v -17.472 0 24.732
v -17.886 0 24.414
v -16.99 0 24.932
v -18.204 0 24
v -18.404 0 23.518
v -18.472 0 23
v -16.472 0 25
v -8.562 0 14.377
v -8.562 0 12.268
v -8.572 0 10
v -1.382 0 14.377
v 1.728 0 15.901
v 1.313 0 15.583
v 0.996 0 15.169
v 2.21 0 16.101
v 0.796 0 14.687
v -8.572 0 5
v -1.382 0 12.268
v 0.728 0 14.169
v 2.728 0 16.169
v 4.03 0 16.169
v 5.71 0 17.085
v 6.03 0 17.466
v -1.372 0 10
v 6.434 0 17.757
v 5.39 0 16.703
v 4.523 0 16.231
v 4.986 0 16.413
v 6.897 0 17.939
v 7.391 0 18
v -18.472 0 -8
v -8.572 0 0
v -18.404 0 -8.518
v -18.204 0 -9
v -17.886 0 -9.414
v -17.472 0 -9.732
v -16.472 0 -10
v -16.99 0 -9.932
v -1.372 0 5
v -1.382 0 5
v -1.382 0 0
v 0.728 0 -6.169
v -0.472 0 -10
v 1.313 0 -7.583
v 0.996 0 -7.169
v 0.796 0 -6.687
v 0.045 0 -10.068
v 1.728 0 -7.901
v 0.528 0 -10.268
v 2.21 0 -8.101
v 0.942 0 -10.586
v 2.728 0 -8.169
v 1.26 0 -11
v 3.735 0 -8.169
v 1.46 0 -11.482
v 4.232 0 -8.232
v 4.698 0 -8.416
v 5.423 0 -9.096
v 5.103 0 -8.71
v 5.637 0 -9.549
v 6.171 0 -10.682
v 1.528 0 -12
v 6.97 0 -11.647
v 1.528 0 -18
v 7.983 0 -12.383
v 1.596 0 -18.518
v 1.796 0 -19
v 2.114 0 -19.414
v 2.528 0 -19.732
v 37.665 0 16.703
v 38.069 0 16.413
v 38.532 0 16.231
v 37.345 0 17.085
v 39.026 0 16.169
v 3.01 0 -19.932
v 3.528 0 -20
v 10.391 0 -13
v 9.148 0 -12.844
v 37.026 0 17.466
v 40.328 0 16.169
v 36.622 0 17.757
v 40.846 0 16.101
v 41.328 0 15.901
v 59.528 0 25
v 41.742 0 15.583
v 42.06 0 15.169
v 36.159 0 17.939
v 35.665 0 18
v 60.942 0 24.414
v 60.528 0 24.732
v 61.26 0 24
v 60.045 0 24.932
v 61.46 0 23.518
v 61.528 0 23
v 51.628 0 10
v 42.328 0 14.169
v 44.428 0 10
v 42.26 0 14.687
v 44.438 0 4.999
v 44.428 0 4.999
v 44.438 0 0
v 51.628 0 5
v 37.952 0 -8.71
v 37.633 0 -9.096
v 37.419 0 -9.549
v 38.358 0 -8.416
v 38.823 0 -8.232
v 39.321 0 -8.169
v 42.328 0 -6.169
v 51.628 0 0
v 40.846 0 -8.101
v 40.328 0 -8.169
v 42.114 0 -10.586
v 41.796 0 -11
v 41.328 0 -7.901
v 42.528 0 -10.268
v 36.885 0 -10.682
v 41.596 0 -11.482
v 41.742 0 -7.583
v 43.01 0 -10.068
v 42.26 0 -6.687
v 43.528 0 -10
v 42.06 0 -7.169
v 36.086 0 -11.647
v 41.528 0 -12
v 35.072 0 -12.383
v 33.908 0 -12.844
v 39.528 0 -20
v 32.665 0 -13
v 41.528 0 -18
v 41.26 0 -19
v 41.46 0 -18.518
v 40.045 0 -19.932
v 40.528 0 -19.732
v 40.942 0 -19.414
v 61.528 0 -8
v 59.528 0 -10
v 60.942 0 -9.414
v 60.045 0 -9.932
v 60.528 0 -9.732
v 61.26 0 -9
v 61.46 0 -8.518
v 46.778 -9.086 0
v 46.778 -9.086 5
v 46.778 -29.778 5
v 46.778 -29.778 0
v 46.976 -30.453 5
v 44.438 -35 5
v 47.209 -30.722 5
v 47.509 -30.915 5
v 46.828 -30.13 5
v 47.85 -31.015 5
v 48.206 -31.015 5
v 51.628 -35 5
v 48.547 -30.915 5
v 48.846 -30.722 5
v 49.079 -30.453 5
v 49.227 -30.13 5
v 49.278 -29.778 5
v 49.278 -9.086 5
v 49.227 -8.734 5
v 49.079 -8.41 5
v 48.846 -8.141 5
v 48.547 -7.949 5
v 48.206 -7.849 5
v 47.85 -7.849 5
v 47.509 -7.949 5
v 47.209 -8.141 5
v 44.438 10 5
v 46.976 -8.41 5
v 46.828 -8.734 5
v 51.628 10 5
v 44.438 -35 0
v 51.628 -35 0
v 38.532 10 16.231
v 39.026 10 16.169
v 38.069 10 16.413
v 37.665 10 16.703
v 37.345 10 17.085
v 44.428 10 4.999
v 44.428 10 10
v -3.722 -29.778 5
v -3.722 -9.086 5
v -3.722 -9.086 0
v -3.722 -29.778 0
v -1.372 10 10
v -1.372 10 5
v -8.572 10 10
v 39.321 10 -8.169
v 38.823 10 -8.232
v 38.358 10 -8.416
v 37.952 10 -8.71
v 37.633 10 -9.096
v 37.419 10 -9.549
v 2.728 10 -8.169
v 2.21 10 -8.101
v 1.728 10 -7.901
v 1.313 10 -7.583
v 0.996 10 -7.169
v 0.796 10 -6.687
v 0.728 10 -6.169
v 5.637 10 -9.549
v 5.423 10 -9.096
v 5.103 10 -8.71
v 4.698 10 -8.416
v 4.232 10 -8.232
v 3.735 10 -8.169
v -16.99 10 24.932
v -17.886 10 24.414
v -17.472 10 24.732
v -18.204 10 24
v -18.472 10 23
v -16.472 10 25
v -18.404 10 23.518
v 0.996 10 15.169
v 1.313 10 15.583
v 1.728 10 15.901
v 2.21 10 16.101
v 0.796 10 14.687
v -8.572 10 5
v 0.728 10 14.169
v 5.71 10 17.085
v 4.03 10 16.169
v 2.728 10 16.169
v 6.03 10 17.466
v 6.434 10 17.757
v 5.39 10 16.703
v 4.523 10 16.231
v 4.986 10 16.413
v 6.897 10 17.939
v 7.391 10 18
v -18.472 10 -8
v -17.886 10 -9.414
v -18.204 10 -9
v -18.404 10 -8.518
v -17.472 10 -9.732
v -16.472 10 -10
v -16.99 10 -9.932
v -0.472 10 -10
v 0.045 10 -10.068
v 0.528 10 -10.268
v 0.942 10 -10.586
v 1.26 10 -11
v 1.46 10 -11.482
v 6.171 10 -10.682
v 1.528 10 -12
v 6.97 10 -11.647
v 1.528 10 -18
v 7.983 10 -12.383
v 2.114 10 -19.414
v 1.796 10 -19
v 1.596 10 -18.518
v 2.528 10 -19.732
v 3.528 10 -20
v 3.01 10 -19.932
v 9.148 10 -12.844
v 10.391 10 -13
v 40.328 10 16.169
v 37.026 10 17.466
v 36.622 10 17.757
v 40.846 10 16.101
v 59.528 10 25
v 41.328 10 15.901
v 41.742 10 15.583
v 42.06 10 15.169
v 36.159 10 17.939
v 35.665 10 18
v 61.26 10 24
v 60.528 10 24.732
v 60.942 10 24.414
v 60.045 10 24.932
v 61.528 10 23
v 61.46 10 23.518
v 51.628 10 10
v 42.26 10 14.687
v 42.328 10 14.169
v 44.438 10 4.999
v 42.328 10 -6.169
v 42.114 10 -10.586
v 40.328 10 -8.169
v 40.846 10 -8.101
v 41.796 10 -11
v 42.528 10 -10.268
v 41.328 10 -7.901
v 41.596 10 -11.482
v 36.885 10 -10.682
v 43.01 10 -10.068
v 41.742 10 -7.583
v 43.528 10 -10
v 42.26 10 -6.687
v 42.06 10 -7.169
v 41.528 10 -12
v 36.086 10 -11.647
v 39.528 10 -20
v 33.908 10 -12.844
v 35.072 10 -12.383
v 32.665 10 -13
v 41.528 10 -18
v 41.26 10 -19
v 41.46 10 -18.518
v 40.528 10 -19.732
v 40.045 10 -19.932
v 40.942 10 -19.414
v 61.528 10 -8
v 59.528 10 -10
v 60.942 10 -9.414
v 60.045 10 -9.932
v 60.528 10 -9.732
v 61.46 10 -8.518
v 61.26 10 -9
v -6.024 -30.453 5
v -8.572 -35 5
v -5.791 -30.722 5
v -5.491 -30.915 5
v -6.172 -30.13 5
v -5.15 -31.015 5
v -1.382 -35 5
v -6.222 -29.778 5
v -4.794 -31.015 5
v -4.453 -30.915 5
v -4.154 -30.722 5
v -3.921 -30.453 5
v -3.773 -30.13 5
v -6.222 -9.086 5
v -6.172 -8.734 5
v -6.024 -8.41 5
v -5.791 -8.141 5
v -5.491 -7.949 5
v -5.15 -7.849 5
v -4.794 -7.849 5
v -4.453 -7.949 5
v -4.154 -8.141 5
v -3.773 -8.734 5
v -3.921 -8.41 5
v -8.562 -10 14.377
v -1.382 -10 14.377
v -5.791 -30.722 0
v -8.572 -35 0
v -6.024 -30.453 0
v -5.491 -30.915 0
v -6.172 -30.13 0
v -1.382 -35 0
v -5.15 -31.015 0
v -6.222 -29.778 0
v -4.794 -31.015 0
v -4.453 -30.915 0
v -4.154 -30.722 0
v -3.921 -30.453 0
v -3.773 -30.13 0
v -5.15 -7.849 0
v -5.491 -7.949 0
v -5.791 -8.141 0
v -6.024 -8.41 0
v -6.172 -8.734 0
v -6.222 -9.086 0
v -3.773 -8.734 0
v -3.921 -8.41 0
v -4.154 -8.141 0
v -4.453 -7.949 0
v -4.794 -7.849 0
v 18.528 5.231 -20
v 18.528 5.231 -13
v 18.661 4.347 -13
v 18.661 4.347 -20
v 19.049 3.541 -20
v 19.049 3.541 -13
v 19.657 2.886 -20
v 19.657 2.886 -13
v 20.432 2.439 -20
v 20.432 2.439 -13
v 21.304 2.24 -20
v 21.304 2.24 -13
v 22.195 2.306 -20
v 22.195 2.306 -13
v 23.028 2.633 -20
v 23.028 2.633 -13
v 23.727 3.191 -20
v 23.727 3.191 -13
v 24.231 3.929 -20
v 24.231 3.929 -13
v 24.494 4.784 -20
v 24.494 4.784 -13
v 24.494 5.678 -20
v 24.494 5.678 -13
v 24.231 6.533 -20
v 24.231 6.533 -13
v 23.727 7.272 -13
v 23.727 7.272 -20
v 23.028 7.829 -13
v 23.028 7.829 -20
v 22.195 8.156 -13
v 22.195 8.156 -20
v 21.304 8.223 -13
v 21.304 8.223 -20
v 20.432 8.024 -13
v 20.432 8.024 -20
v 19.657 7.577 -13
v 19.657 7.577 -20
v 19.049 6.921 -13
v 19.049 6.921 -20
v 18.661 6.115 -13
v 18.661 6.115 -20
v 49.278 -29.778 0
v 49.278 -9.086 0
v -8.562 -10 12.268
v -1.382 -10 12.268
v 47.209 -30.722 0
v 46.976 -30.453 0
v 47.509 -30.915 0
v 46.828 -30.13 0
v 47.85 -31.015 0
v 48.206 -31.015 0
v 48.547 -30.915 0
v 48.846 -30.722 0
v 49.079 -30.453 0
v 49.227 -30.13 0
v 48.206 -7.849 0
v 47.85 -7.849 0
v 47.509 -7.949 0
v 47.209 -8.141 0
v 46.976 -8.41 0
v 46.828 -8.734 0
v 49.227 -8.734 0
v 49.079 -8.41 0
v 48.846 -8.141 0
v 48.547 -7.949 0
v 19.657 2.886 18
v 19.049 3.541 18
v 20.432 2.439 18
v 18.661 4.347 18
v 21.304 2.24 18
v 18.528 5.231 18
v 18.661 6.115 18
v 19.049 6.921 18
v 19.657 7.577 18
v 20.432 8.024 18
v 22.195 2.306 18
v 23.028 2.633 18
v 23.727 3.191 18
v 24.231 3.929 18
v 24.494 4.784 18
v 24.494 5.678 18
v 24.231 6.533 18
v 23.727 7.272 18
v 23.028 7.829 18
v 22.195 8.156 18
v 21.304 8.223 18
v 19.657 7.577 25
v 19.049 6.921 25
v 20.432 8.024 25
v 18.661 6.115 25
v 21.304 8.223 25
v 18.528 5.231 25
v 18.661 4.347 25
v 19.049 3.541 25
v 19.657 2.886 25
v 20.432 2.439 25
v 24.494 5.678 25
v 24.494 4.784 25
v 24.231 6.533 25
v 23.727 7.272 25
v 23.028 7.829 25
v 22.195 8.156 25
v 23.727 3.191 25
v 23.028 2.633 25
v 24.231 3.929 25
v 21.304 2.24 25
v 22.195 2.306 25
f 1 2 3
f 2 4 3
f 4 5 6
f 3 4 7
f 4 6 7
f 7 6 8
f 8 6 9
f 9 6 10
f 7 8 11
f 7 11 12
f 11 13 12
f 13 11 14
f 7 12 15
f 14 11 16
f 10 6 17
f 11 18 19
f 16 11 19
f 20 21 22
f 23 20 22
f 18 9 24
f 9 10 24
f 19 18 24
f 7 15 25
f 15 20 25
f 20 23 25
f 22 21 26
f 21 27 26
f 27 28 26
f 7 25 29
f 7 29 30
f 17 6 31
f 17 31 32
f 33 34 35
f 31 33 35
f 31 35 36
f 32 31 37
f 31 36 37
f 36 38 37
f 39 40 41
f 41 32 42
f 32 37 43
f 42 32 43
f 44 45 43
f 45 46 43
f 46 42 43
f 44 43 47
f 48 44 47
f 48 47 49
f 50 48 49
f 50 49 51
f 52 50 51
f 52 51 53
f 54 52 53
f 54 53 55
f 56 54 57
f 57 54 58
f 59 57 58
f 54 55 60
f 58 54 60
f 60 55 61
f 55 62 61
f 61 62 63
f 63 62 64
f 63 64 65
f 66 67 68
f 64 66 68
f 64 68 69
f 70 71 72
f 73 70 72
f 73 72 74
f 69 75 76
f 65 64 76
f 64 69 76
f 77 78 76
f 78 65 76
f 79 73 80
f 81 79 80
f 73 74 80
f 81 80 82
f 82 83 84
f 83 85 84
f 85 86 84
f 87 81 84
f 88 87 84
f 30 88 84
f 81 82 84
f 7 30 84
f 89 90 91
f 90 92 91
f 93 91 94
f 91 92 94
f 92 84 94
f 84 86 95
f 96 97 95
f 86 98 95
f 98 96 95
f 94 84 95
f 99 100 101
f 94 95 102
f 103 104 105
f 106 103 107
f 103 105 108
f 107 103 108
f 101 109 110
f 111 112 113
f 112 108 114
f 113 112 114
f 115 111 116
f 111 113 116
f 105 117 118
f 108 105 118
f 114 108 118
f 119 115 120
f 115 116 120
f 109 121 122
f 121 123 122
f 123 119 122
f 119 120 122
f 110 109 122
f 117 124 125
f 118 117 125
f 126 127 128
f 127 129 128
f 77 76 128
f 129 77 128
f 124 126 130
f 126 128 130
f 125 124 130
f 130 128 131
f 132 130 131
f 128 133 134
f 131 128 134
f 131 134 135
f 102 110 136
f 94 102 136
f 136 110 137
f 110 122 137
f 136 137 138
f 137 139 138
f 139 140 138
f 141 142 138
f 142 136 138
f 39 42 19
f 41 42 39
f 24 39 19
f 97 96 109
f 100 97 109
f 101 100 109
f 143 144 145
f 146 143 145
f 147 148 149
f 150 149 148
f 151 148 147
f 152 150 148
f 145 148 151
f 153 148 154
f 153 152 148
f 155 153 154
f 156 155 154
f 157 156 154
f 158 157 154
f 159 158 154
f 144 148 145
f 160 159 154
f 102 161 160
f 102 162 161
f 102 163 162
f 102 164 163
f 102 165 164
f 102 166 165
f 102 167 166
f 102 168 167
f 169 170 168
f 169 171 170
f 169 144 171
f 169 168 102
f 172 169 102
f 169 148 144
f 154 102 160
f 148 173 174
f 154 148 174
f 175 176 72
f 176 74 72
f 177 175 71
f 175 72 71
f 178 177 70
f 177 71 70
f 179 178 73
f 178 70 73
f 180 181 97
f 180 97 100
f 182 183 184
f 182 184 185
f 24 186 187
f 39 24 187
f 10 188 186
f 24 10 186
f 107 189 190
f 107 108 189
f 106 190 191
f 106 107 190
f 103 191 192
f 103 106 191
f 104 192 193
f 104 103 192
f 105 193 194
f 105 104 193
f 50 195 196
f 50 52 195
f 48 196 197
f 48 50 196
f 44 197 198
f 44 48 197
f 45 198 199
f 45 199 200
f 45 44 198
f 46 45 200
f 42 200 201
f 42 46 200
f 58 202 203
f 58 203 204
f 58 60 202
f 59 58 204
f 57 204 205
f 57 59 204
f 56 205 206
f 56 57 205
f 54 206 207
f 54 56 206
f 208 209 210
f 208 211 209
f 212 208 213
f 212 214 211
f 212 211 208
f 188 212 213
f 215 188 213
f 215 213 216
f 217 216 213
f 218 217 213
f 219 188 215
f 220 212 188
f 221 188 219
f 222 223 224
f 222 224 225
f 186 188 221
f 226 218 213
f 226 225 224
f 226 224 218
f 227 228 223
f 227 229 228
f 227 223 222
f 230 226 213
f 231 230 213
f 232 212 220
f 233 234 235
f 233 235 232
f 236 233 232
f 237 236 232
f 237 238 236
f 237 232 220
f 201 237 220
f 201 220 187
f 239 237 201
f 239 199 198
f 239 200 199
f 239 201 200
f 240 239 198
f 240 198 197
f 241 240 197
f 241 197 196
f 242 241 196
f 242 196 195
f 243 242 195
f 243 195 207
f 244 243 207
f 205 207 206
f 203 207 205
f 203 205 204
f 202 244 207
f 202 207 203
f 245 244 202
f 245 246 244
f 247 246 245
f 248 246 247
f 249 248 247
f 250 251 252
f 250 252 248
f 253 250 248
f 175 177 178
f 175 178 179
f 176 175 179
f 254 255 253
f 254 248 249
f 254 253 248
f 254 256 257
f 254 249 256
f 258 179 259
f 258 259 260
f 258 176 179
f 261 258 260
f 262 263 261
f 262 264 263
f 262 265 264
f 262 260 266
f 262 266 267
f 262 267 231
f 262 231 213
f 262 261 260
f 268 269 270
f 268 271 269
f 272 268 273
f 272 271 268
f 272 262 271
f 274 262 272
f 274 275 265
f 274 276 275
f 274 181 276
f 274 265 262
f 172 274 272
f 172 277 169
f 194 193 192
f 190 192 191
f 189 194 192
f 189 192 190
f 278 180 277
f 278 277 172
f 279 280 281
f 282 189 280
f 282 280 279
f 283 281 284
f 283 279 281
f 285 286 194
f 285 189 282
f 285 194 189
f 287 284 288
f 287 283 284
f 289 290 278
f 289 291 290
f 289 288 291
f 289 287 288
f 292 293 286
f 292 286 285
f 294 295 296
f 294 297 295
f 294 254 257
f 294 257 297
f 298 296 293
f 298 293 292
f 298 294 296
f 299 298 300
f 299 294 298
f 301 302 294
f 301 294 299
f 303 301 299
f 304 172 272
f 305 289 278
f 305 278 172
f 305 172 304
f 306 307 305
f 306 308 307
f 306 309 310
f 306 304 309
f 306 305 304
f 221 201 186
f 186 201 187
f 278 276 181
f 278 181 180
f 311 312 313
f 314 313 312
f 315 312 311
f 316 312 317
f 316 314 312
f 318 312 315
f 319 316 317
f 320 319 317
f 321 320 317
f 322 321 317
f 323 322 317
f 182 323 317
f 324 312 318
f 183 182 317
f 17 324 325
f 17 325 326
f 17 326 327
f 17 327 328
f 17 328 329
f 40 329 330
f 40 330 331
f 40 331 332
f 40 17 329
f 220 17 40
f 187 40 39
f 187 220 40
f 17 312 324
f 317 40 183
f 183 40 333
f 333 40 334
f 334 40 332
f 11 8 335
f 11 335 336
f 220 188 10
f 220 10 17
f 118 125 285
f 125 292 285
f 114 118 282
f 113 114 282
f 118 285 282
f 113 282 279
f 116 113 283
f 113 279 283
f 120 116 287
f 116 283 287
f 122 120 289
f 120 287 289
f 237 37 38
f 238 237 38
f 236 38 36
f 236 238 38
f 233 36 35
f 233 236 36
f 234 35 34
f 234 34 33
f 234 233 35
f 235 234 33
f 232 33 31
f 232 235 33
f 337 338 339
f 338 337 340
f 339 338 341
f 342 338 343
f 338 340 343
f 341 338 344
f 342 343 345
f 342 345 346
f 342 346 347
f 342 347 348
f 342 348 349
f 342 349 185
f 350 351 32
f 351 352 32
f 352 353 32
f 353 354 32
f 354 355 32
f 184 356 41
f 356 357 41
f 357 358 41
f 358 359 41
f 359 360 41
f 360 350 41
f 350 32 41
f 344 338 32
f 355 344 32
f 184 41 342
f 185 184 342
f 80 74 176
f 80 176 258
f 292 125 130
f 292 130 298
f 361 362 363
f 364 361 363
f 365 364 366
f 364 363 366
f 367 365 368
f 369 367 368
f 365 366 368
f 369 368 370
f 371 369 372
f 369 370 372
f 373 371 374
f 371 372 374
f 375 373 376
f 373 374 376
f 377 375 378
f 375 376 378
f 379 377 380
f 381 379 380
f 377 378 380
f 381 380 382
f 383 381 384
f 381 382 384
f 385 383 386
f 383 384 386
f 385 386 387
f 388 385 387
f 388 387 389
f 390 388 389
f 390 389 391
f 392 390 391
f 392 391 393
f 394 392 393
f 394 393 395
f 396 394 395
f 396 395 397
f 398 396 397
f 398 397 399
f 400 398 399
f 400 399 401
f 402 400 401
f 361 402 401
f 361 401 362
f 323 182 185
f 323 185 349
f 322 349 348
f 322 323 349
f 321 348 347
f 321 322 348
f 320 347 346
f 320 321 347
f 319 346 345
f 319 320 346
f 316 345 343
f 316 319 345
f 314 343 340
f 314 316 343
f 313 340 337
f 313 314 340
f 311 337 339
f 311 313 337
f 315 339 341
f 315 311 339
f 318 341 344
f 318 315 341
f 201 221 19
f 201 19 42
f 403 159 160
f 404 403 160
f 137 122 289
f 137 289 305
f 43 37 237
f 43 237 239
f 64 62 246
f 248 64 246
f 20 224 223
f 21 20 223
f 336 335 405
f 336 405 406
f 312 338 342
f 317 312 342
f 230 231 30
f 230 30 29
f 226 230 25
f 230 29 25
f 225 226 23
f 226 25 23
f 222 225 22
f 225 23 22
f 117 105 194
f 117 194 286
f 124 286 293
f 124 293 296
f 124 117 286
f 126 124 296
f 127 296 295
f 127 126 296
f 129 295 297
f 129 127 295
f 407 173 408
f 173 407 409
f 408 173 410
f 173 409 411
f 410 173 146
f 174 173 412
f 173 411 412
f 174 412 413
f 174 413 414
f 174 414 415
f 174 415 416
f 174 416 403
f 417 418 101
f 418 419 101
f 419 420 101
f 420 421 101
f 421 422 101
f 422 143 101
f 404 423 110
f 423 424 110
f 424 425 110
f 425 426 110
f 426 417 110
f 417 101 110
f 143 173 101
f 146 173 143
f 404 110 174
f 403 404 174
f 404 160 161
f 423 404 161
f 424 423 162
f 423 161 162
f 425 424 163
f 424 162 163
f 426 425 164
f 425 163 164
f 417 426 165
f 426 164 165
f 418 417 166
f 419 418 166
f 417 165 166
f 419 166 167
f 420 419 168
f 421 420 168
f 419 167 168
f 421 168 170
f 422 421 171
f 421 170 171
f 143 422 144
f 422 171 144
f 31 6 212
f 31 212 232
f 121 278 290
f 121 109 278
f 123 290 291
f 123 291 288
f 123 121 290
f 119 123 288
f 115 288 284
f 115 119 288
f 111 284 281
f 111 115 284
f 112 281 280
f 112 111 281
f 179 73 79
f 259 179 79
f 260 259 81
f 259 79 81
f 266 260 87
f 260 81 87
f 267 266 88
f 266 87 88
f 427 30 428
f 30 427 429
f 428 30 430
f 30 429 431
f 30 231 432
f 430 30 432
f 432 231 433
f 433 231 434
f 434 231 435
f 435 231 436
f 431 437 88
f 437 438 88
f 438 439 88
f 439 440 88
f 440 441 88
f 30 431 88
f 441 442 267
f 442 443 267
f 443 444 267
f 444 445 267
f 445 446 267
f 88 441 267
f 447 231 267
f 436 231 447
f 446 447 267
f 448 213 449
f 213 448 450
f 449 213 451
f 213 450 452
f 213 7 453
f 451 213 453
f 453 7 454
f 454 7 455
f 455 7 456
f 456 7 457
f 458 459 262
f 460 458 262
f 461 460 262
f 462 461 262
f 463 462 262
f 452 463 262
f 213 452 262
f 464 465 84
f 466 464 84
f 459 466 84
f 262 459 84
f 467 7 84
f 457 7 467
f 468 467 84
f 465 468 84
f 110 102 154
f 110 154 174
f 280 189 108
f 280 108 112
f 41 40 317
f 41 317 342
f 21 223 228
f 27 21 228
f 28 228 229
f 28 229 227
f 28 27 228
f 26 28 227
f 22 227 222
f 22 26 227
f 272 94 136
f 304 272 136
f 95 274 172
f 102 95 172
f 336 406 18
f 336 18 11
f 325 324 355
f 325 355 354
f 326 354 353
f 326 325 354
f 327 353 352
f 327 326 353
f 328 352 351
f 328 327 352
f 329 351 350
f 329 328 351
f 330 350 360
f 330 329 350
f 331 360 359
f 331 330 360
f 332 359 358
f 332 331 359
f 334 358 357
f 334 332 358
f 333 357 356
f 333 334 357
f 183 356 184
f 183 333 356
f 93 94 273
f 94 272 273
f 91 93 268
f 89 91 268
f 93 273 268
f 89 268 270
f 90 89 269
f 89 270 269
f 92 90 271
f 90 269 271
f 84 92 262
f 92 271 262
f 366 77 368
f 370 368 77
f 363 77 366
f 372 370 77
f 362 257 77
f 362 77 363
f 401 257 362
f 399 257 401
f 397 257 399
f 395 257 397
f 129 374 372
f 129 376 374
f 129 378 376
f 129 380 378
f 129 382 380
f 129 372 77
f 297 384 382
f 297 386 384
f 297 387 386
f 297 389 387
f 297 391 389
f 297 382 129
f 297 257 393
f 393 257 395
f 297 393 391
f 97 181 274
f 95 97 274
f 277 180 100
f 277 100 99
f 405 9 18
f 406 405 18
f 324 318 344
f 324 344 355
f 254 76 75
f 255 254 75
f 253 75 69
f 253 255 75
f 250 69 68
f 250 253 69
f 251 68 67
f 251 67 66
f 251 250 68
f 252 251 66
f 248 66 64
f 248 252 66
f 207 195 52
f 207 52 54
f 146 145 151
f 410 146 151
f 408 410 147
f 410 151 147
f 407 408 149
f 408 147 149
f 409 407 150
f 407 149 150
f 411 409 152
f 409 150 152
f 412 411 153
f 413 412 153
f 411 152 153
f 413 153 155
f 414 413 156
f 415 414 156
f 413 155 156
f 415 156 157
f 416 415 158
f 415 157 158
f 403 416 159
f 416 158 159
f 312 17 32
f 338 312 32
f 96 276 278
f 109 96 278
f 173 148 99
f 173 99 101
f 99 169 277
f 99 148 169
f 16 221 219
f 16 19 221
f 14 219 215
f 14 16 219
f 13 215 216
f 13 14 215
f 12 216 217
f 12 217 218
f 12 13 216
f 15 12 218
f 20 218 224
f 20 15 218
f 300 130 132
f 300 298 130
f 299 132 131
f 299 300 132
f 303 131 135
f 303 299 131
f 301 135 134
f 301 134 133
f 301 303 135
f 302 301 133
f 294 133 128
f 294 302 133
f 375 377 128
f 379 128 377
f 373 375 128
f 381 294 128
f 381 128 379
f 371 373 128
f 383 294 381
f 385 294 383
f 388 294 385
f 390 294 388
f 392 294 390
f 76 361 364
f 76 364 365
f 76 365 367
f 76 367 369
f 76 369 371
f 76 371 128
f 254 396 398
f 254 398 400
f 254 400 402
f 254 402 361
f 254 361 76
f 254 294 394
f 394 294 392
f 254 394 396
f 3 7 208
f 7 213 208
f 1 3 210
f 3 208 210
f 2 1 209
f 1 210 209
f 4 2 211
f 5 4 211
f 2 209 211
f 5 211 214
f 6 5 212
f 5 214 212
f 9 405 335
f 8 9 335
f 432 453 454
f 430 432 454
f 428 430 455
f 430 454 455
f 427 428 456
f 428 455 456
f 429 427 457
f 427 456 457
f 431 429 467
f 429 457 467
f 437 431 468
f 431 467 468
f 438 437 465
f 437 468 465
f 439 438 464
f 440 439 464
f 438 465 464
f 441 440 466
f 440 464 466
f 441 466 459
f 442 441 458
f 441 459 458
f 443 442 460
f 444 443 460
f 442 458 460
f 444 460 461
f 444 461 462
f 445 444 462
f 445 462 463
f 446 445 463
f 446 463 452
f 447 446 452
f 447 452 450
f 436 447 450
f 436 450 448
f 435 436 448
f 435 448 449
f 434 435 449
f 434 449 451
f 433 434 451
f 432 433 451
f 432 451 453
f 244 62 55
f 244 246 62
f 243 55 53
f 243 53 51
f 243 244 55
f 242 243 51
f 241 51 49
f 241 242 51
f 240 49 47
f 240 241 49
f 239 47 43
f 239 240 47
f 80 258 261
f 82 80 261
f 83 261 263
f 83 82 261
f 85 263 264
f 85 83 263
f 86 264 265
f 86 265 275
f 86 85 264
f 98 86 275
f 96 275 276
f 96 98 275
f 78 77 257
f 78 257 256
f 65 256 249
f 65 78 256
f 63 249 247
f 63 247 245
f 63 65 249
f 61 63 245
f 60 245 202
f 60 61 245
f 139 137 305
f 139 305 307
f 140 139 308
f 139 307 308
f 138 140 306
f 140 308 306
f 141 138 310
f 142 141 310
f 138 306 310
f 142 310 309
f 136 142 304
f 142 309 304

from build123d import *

# Parameters (mm, degrees)
SKETCH_1_W          = 80
SKETCH_1_H          = 35
EXTRUDE_1_DEPTH     = 10
SKETCH_2_W          = 7.2
SKETCH_2_H          = 5
SKETCH_2_H_2        = 5.001973484
CUT_EXTRUDE_1_DEPTH = 20
SKETCH_6_W          = 7.19
SKETCH_6_H          = 5
EXTRUDE_7_DEPTH     = 45
SKETCH_7_R          = 1.25
CUT_EXTRUDE_2_DEPTH = 30
SKETCH_8_W          = 40
SKETCH_8_H          = 10
EXTRUDE_8_DEPTH     = 10
SKETCH_10_W         = 32.274232457
SKETCH_10_H         = 31.000986742
CUT_EXTRUDE_3_DEPTH = 10
FILLET_1_R          = 5
FILLET_2_R          = 2
SKETCH_11_R         = 3
CUT_EXTRUDE_4_DEPTH = 50
CUT_EXTRUDE_5_DEPTH = 50
FILLET_3_R          = 2
SKETCH_13_W         = 7.18
SKETCH_13_H         = 2.109830921
EXTRUDE_9_DEPTH     = 10
SKETCH_14_W         = 41.600257034
SKETCH_14_H         = 24.338135392
CUT_EXTRUDE_6_DEPTH = 10
FILLET_5_R          = 2


with BuildPart() as part:
    # 草图1 → 凸台-拉伸1 (new body)
    with BuildSketch(Plane(origin=(0, 0, 0), x_dir=(1, 0, 0), z_dir=(0, 1, 0))):
        with Locations((21.527777778, -7.5)):
            Rectangle(SKETCH_1_W, SKETCH_1_H)
    extrude(amount=EXTRUDE_1_DEPTH)

    # 草图2 → 切除-拉伸1 (cut)
    with BuildSketch(Plane(origin=(0, 10, 0), x_dir=(1, 0, 0), z_dir=(0, 1, 0))):
        with Locations((-4.972222222, -7.500493371)):
            Rectangle(SKETCH_2_W, SKETCH_2_H)
        with Locations((48.027777778, -7.499506629)):
            Rectangle(SKETCH_2_W, SKETCH_2_H_2)
    extrude(amount=-CUT_EXTRUDE_1_DEPTH, mode=Mode.SUBTRACT)

    # 草图6 → 凸台-拉伸7 (add)
    with BuildSketch(Plane(origin=(0, 10, 0), x_dir=(1, 0, 0), z_dir=(0, 1, 0))):
        with Locations((-4.977222222, -2.500493371)):
            Rectangle(SKETCH_6_W, SKETCH_6_H)
        with Locations((48.032777778, -2.500493371)):
            Rectangle(SKETCH_6_W, SKETCH_6_H)
    extrude(amount=-EXTRUDE_7_DEPTH)

    # 草图7 → 切除-拉伸2 (cut)
    with BuildSketch(Plane.XY.offset(5.000493371)):
        with Locations((-4.972222222, -12)):
            Circle(SKETCH_7_R)
        with Locations((48.027777778, -12)):
            Circle(SKETCH_7_R)
    extrude(amount=-CUT_EXTRUDE_2_DEPTH, mode=Mode.SUBTRACT)

    # 草图8 → 凸台-拉伸8 (add)
    with BuildSketch(Plane(origin=(0, 0, -10), x_dir=(-1, 0, 0), z_dir=(0, 0, -1))):
        with Locations((-21.527777778, 5)):
            Rectangle(SKETCH_8_W, SKETCH_8_H)
    extrude(amount=EXTRUDE_8_DEPTH)

    # 草图10 → 切除-拉伸3 (cut)
    with BuildSketch(Plane(origin=(0, 10, 0), x_dir=(1, 0, 0), z_dir=(0, 1, 0))):
        with Locations((21.527777778, -2.5)):
            Rectangle(SKETCH_10_W, SKETCH_10_H)
    extrude(amount=-CUT_EXTRUDE_3_DEPTH, mode=Mode.SUBTRACT)

    # 圆角1
    fillet_1_edges = [part.edges().sort_by_distance(p)[0] for p in [
        (37.664894006, 5, -13.000493371),
        (5.390661549, 5, -13.000493371),
    ]]
    fillet(fillet_1_edges, radius=FILLET_1_R)

    # 圆角2
    fillet_2_edges = [part.edges().sort_by_distance(p)[0] for p in [
        (37.664894006, 5, 18.000493371),
        (5.390661549, 5, 18.000493371),
    ]]
    fillet(fillet_2_edges, radius=FILLET_2_R)

    # 草图11 → 切除-拉伸4 (cut)
    with BuildSketch(Plane.XY.offset(25)):
        with Locations(Location((21.527777778, 5.231122454, 0), (0, 0, 180))):
            Circle(SKETCH_11_R)
    extrude(amount=-CUT_EXTRUDE_4_DEPTH, mode=Mode.SUBTRACT)

    # 草图12 → 切除-拉伸5 (cut)
    with BuildSketch(Plane.XY.offset(5.000493371)):
        with BuildLine():
            Line((-3.722222222, -9.086156221), (-3.722222222, -29.777694538))
            ThreePointArc((-3.722222222, -29.777694538), (-4.972222222, -31.027694538), (-6.222222222, -29.777694538))
            Line((-6.222222222, -29.777694538), (-6.222222222, -9.086156221))
            ThreePointArc((-6.222222222, -9.086156221), (-4.972222222, -7.836156221), (-3.722222222, -9.086156221))
        make_face()
        with BuildLine():
            Line((46.777777778, -9.086156221), (46.777777778, -29.777694538))
            ThreePointArc((46.777777778, -29.777694538), (48.027777778, -31.027694538), (49.277777778, -29.777694538))
            Line((49.277777778, -29.777694538), (49.277777778, -9.086156221))
            ThreePointArc((49.277777778, -9.086156221), (48.027777778, -7.836156221), (46.777777778, -9.086156221))
        make_face()
    extrude(amount=-CUT_EXTRUDE_5_DEPTH, mode=Mode.SUBTRACT)

    # 圆角3
    fillet_3_edges = [part.edges().sort_by_distance(p)[0] for p in [
        (41.527777778, 5, -10),
        (1.527777778, 5, -10),
        (41.527777778, 5, -20),
        (1.527777778, 5, -20),
        (61.527777778, 5, 25),
        (-18.472222222, 5, 25),
        (-18.472222222, 5, -10),
        (61.527777778, 5, -10),
    ]]
    fillet(fillet_3_edges, radius=FILLET_3_R)

    # 草图13 → 凸台-拉伸9 (add)
    with BuildSketch(Plane.XZ):
        with Locations((-4.972222222, 13.322503868)):
            Rectangle(SKETCH_13_W, SKETCH_13_H)
    extrude(amount=EXTRUDE_9_DEPTH)

    # 草图14 → 切除-拉伸6 (cut)
    with BuildSketch(Plane(origin=(0, 10, 0), x_dir=(1, 0, 0), z_dir=(0, 1, 0))):
        with Locations((21.527777778, -4)):
            Rectangle(SKETCH_14_W, SKETCH_14_H)
    extrude(amount=-CUT_EXTRUDE_6_DEPTH, mode=Mode.SUBTRACT)

    # 圆角5
    fillet_5_edges = [part.edges().sort_by_distance(p)[0] for p in [
        (5.397778538, 5, 16.169067696),
        (5.393504088, 5, -8.169067696),
        (37.662051468, 5, -8.169067696),
        (0.727649261, 5, -8.169067696),
        (37.657777017, 5, 16.169067696),
        (42.327906295, 5, 16.169067696),
        (0.727649261, 5, 16.169067696),
        (42.327906295, 5, -8.169067696),
    ]]
    fillet(fillet_5_edges, radius=FILLET_5_R)


solid = part.part
